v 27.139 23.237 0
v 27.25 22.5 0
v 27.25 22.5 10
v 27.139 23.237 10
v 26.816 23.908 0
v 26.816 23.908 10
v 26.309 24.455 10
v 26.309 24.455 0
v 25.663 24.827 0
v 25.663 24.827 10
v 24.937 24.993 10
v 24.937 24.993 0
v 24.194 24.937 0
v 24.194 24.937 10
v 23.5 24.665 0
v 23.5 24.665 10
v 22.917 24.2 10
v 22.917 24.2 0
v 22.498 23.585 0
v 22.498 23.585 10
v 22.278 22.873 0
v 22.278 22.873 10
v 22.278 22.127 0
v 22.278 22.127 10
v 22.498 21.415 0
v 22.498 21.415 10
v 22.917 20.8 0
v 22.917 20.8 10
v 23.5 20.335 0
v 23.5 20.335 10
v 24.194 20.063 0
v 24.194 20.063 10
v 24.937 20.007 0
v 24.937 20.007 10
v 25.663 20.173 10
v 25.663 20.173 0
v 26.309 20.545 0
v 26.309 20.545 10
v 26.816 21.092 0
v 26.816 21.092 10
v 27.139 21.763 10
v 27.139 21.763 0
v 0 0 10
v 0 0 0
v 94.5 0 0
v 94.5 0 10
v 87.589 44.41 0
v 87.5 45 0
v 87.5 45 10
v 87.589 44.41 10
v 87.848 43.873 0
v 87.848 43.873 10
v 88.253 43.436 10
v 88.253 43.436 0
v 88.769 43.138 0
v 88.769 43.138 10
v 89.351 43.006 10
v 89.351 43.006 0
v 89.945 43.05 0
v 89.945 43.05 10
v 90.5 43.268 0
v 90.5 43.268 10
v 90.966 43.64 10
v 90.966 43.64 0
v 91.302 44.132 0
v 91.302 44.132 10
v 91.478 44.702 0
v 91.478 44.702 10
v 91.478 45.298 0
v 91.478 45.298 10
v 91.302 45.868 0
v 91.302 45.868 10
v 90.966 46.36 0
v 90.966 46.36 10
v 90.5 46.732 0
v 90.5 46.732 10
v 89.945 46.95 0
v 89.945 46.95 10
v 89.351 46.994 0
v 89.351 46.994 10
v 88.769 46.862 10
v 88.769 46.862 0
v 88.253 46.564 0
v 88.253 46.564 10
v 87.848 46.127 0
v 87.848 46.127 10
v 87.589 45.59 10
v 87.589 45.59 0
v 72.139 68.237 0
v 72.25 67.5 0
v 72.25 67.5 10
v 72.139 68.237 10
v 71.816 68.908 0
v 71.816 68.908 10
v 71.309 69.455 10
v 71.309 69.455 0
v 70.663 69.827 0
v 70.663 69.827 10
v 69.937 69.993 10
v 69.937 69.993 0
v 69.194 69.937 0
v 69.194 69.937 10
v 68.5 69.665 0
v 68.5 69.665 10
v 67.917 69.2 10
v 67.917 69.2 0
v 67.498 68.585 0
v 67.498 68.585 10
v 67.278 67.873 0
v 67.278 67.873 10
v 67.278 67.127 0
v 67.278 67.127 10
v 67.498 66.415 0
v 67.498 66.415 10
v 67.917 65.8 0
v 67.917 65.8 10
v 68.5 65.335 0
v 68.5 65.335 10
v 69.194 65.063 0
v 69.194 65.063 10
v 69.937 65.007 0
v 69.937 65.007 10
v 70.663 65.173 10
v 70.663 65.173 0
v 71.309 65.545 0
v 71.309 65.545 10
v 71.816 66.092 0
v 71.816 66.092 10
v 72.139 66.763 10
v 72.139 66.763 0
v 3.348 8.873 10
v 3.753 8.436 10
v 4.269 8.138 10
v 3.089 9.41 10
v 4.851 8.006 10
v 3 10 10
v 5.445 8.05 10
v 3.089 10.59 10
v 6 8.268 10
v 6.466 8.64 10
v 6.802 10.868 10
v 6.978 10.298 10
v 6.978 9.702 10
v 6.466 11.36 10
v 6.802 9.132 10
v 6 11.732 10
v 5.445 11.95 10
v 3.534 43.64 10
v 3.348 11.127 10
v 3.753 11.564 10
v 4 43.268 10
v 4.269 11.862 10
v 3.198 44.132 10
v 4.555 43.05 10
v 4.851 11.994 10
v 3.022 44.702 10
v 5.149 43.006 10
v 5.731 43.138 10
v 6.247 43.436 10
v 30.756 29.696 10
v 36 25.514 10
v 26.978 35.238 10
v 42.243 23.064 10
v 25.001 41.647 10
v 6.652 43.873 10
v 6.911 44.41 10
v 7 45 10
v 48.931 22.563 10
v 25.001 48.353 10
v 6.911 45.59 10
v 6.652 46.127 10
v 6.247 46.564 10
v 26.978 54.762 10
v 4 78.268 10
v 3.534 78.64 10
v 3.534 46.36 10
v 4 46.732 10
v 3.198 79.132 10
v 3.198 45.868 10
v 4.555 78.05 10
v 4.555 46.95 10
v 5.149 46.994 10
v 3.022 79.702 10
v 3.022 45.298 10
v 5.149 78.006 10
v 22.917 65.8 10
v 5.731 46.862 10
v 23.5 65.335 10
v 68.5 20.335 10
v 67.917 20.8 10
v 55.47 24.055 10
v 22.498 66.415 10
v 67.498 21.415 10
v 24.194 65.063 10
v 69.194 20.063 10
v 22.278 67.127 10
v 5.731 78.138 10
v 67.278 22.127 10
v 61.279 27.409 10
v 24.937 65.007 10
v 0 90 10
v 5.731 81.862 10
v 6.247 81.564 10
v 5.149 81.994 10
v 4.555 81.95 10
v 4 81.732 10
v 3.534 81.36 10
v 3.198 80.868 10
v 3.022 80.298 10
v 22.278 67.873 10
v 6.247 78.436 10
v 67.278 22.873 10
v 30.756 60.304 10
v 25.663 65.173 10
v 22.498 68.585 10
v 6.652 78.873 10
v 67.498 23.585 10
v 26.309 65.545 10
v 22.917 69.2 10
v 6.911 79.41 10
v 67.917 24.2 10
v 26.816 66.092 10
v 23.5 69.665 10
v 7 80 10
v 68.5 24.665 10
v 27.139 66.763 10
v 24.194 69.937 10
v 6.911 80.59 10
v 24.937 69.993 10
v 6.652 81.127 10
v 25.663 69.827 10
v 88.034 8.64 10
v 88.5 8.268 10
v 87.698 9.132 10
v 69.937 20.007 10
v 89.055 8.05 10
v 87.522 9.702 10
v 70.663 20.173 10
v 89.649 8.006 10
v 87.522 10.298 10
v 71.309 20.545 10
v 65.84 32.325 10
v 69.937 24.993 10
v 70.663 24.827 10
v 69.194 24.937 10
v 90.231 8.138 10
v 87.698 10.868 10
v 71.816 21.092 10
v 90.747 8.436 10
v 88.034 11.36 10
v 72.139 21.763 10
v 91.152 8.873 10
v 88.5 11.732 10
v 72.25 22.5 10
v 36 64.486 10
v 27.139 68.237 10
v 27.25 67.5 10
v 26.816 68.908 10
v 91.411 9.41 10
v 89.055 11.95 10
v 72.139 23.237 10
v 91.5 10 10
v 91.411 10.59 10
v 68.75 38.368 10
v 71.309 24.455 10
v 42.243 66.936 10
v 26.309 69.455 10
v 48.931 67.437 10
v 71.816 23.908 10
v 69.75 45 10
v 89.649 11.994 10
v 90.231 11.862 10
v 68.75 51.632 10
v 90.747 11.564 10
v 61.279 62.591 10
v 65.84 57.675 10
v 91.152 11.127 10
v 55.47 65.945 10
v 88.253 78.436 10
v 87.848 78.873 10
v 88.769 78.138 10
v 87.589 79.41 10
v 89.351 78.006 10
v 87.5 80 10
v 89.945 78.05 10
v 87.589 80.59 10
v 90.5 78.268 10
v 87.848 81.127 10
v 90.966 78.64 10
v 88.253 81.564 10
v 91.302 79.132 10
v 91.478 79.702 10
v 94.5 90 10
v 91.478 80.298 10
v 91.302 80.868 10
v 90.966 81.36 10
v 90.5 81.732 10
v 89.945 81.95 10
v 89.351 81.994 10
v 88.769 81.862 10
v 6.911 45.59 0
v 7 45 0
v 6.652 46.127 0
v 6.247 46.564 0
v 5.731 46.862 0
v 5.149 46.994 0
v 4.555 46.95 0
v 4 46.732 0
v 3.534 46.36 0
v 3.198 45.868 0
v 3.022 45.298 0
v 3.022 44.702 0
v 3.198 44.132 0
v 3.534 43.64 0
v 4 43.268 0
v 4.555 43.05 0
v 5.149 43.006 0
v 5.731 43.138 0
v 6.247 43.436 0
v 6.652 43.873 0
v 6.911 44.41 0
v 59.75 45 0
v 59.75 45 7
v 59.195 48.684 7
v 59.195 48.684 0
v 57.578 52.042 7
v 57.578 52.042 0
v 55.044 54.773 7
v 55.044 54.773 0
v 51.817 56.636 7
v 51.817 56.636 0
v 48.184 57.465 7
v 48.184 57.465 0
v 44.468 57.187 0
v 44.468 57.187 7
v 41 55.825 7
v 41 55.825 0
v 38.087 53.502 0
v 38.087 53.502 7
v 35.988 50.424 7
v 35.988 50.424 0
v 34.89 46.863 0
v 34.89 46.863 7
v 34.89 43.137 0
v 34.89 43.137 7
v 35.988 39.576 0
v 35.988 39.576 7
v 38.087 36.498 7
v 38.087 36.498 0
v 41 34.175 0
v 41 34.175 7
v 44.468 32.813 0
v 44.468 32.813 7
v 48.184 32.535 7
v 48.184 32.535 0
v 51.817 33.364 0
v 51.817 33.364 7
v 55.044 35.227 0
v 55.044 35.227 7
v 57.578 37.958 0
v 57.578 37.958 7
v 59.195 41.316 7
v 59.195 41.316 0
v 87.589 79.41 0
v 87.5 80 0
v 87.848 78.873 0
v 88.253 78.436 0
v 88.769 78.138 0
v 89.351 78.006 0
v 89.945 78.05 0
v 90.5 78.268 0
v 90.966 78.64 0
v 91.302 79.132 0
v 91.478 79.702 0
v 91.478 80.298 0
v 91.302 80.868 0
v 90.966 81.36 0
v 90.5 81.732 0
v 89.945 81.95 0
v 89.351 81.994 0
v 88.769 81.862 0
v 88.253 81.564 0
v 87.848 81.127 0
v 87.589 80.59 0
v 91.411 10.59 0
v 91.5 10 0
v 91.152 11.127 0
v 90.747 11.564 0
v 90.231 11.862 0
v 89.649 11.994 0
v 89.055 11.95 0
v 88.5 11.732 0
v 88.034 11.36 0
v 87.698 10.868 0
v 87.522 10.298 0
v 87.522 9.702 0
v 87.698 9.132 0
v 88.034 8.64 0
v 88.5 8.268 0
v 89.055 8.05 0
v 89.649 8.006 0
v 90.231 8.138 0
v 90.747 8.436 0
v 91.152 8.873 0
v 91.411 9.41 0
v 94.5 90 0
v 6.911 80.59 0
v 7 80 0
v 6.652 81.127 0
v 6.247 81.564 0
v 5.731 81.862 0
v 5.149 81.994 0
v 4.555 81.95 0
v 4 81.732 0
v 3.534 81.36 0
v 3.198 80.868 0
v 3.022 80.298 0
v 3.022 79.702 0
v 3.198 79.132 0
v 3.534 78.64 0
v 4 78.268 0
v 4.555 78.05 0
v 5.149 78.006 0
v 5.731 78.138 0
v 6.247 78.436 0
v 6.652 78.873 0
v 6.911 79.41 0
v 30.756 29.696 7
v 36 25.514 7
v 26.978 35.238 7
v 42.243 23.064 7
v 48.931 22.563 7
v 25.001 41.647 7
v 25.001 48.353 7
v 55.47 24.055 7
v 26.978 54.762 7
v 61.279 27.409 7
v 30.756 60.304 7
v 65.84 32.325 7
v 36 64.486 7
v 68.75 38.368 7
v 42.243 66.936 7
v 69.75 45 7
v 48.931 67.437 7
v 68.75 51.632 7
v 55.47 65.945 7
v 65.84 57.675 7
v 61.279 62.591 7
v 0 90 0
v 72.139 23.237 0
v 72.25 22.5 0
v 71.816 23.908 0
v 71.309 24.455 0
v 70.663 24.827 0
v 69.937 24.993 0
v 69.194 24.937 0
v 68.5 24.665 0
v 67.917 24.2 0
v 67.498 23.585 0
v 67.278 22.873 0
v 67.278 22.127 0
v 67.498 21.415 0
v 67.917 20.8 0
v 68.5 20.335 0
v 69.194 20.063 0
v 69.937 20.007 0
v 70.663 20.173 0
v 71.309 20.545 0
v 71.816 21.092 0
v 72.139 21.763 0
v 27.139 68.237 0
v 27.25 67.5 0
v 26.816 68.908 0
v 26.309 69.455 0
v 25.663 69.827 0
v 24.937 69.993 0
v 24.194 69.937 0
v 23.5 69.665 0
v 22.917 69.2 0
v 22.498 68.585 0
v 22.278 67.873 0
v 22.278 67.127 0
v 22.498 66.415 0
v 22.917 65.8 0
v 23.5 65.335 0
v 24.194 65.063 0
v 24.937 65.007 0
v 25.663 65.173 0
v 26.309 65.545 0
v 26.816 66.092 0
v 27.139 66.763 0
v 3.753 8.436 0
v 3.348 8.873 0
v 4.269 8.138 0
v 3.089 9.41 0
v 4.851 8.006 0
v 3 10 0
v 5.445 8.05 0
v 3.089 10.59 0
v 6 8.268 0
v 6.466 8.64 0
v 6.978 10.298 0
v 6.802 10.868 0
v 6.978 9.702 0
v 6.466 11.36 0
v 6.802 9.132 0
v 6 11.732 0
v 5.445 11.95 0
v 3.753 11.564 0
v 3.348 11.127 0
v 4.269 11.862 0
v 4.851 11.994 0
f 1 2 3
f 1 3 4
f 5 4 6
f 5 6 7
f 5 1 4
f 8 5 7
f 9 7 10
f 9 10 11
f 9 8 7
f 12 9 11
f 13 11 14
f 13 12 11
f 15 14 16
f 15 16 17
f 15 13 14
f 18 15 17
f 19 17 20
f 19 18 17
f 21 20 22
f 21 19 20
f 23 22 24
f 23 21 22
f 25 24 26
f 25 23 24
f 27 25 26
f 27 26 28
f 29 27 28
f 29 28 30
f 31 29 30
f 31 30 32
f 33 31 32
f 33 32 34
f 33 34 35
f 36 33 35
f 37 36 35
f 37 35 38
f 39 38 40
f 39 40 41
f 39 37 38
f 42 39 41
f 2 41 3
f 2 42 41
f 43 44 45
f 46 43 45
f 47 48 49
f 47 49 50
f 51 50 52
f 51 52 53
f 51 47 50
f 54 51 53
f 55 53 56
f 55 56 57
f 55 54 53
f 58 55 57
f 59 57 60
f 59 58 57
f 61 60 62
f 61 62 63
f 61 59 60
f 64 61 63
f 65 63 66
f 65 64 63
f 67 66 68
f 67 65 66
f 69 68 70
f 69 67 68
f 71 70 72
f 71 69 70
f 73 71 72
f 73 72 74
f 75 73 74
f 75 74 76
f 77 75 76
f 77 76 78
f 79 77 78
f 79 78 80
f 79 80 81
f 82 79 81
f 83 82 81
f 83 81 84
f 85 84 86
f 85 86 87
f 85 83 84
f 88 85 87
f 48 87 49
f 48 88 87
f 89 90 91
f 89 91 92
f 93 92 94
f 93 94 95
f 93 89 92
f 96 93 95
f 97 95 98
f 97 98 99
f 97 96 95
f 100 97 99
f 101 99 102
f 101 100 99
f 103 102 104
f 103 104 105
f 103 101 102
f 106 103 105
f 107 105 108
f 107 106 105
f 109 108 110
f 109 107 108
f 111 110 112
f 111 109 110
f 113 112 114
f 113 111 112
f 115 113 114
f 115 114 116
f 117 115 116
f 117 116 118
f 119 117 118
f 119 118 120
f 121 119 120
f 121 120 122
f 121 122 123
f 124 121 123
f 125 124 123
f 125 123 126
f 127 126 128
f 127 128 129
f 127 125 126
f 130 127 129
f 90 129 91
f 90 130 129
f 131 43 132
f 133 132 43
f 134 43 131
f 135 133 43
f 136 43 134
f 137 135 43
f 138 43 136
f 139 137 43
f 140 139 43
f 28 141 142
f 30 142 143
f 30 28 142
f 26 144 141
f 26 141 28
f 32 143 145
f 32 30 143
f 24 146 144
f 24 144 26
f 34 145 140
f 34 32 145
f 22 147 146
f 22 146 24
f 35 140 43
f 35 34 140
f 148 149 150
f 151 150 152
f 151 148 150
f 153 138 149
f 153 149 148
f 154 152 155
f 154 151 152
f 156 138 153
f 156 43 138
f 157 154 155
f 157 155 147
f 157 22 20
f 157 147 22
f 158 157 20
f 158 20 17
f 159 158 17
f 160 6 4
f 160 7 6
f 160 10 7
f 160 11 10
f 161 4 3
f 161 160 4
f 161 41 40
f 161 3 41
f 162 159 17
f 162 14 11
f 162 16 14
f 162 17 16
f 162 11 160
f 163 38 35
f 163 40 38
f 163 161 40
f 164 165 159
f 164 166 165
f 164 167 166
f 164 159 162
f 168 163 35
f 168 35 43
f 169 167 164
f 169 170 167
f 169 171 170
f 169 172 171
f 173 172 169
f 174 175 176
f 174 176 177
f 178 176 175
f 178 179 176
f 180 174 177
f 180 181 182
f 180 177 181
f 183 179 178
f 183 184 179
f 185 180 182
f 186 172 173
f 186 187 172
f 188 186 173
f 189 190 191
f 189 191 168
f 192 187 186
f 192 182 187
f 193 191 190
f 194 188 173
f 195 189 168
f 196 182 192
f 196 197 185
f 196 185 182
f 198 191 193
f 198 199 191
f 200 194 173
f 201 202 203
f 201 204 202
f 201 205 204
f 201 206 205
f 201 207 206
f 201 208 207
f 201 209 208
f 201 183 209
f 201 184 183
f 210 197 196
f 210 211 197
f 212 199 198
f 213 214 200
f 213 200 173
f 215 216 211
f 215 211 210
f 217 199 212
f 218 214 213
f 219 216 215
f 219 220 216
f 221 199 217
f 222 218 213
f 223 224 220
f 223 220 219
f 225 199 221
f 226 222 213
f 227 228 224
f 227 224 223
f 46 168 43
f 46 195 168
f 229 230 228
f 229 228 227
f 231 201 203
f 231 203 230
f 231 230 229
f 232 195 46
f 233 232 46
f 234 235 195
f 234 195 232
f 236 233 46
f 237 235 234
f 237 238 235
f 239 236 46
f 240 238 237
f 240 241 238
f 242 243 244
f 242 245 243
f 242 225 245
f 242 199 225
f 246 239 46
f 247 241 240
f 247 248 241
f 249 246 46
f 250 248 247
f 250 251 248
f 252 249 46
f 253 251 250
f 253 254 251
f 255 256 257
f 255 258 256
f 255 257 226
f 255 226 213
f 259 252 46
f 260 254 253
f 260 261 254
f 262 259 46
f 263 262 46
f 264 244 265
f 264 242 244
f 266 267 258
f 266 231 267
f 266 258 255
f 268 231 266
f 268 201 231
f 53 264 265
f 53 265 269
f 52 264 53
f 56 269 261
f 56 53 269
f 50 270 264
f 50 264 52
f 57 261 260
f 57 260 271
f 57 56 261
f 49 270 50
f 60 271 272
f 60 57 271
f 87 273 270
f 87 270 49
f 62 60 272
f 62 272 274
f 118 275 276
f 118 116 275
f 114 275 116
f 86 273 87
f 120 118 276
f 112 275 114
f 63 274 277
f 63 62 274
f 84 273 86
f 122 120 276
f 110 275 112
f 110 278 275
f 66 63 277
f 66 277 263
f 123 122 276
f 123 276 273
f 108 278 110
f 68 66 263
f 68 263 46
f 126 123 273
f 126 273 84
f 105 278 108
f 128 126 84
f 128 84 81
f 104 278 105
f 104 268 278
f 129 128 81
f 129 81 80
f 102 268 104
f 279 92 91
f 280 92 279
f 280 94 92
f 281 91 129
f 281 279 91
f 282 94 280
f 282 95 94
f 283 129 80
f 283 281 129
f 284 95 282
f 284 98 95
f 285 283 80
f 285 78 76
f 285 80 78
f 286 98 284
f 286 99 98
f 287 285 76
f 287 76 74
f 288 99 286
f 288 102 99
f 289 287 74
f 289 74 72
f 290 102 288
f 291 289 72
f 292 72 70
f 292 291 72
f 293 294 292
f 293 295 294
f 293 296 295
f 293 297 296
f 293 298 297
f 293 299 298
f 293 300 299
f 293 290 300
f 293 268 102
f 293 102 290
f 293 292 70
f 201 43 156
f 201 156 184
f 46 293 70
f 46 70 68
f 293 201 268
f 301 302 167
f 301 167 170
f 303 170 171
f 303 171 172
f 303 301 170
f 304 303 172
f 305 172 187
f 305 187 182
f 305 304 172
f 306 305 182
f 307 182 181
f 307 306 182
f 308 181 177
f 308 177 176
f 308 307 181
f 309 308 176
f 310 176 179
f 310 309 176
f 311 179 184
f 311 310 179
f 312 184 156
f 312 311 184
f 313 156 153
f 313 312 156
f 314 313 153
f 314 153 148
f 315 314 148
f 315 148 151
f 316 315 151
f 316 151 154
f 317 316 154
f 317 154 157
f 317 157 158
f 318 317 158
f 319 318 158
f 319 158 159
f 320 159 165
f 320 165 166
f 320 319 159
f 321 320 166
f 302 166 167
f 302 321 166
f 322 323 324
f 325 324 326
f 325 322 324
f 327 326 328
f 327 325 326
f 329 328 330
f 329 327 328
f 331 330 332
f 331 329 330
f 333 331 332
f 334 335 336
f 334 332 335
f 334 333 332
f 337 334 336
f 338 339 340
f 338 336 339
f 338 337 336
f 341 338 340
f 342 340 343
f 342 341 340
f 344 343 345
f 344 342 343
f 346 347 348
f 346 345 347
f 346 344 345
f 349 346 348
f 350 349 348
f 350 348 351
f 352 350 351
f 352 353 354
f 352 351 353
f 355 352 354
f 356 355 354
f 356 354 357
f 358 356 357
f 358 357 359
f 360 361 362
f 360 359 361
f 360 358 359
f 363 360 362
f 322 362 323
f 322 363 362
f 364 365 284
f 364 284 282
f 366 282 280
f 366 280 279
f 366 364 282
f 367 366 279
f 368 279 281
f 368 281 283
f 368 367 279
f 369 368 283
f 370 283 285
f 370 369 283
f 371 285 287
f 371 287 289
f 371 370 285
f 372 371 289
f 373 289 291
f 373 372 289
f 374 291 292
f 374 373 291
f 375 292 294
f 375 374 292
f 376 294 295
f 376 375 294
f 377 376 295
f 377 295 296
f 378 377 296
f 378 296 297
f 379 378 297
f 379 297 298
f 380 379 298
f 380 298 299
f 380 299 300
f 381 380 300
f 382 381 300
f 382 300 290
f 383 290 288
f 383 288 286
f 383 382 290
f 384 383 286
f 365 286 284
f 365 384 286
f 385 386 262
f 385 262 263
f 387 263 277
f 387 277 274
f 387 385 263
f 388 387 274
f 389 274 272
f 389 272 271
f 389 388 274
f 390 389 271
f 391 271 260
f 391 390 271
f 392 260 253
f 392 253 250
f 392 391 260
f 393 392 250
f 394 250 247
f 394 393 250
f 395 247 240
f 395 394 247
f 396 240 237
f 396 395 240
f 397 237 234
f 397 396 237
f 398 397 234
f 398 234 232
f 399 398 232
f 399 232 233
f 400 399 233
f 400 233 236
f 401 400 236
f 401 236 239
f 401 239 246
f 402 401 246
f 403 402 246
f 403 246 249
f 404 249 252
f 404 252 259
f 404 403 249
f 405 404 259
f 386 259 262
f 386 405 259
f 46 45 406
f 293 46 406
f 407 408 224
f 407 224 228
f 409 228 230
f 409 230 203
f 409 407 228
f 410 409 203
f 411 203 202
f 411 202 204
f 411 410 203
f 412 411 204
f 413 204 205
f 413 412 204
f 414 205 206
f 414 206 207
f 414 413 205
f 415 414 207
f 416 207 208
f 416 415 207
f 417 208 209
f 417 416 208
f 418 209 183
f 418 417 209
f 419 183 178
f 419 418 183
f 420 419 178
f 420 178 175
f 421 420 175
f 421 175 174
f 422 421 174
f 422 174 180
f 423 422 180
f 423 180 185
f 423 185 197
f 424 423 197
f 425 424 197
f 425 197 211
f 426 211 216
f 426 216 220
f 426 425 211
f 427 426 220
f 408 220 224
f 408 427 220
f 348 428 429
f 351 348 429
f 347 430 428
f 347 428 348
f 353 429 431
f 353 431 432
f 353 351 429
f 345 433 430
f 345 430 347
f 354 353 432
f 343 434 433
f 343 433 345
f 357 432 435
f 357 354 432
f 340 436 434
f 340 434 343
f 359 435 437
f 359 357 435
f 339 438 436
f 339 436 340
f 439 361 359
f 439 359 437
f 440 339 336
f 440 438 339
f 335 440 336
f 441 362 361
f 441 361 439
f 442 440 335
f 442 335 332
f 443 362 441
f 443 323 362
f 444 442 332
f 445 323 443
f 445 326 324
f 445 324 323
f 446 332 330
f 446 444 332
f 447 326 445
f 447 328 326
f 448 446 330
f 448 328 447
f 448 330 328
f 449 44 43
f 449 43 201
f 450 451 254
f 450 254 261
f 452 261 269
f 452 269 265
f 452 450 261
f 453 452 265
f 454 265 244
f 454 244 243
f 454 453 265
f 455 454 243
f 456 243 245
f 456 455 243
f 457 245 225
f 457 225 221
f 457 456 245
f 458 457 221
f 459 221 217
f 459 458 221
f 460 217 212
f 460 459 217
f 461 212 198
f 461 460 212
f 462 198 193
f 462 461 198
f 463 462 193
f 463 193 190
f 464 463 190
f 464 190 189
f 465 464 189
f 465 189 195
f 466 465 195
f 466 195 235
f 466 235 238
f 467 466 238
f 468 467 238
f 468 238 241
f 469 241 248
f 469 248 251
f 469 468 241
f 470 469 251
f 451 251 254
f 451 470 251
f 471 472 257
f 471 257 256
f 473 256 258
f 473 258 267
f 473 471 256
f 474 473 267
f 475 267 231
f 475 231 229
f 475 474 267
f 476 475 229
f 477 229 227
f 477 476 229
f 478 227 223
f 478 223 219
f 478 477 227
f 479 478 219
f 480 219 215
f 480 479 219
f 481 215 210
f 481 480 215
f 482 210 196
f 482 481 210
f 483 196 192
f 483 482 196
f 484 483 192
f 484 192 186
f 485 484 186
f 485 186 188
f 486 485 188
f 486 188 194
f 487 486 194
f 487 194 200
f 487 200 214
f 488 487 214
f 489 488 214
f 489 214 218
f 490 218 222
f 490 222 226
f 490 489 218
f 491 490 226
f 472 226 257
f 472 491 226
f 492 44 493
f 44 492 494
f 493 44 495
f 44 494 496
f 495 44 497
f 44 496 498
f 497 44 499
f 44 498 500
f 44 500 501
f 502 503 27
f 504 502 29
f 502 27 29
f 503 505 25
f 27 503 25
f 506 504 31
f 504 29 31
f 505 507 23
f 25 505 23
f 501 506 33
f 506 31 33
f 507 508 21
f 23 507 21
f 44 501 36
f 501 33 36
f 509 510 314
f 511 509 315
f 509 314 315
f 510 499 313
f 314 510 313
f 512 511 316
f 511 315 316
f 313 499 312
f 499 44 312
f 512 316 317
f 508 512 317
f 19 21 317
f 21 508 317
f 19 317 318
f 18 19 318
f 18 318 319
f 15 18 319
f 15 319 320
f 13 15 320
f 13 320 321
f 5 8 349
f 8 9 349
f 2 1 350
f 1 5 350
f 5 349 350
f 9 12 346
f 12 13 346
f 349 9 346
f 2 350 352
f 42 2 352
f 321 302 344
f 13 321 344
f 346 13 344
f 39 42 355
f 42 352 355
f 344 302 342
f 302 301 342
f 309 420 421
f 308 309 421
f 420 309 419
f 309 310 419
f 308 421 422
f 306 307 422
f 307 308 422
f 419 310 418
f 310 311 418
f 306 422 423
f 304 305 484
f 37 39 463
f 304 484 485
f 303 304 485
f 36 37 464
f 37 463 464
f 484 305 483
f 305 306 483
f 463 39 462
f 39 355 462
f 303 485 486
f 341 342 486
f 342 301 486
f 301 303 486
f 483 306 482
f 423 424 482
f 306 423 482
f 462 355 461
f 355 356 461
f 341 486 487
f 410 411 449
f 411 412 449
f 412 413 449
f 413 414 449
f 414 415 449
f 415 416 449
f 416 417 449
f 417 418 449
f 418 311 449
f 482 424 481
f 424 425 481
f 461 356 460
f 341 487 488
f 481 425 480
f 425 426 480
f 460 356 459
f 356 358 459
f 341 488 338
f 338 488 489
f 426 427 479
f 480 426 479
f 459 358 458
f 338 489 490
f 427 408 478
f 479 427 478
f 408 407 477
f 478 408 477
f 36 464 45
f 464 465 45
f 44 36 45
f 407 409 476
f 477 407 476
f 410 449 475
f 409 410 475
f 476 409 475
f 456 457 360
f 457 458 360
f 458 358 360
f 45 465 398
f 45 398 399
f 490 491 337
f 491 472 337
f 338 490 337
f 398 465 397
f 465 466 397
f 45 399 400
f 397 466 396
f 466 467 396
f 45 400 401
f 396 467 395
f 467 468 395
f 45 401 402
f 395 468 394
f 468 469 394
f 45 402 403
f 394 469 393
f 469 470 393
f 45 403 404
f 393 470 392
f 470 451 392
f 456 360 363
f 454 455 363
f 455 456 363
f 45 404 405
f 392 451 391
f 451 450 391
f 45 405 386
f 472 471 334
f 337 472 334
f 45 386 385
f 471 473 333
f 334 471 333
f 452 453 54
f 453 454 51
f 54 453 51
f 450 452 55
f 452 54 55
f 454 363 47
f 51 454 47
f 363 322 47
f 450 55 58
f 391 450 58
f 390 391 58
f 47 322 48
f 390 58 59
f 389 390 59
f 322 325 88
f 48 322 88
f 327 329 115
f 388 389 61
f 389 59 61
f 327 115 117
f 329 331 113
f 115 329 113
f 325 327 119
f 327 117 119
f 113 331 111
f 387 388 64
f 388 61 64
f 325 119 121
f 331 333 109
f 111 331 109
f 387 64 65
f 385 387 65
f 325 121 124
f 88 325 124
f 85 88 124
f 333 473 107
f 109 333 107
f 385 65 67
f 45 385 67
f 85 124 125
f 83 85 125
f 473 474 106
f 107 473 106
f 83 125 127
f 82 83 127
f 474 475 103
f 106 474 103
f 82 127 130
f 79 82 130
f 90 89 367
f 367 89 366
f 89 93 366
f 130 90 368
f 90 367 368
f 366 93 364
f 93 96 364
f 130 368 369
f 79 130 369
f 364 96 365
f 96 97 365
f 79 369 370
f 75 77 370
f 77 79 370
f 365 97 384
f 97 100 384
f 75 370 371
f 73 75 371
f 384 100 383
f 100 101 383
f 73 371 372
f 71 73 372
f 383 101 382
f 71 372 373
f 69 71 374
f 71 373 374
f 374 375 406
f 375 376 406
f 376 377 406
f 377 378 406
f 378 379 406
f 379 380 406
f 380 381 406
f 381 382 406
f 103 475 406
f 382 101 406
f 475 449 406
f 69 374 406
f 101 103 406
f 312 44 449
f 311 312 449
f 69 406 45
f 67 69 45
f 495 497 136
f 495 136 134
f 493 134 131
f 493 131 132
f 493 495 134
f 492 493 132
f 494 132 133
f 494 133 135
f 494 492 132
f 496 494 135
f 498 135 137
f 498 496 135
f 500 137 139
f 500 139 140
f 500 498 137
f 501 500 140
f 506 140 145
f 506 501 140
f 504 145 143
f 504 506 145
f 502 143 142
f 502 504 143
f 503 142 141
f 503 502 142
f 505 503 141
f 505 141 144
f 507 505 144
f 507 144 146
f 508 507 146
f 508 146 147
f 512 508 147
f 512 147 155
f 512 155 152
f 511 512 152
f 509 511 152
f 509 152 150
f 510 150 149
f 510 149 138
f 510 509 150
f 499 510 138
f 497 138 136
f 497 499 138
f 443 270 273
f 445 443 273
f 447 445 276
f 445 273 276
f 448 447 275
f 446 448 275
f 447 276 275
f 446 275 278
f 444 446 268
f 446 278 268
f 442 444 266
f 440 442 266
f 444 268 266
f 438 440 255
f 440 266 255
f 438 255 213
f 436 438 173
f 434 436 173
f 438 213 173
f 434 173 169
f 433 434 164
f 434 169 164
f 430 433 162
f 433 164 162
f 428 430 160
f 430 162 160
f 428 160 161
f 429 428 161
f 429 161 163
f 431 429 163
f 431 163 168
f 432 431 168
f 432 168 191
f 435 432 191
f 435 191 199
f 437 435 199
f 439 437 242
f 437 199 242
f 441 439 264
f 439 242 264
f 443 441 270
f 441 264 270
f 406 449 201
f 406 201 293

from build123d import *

# Parameters (mm, degrees)
SKETCH1_W           = 94.5
SKETCH1_H           = 90
SKETCH1_R           = 2
SKETCH1_R_2         = 2.5
SKETCH1_R_3         = 12.5
BOSS_EXTRUDE1_DEPTH = 10
SKETCH3_R           = 22.5
CUT_EXTRUDE2_DEPTH  = 3


with BuildPart() as part:
    # Sketch1 → Boss-Extrude1 (new body)
    with BuildSketch(Plane.XY):
        with Locations((47.25, 45)):
            Rectangle(SKETCH1_W, SKETCH1_H)
        with Locations((5, 80)):
            Circle(SKETCH1_R, mode=Mode.SUBTRACT)
        with Locations((5, 45)):
            Circle(SKETCH1_R, mode=Mode.SUBTRACT)
        with Locations(Location((5, 10, 0), (0, 0, 180))):
            Circle(SKETCH1_R, mode=Mode.SUBTRACT)
        with Locations((89.5, 10)):
            Circle(SKETCH1_R, mode=Mode.SUBTRACT)
        with Locations(Location((89.5, 45, 0), (0, 0, 180))):
            Circle(SKETCH1_R, mode=Mode.SUBTRACT)
        with Locations(Location((89.5, 80, 0), (0, 0, 180))):
            Circle(SKETCH1_R, mode=Mode.SUBTRACT)
        with Locations((24.75, 67.5)):
            Circle(SKETCH1_R_2, mode=Mode.SUBTRACT)
        with Locations((69.75, 67.5)):
            Circle(SKETCH1_R_2, mode=Mode.SUBTRACT)
        with Locations((69.75, 22.5)):
            Circle(SKETCH1_R_2, mode=Mode.SUBTRACT)
        with Locations((24.75, 22.5)):
            Circle(SKETCH1_R_2, mode=Mode.SUBTRACT)
        with Locations((47.25, 45)):
            Circle(SKETCH1_R_3, mode=Mode.SUBTRACT)
    extrude(amount=BOSS_EXTRUDE1_DEPTH)

    # Sketch3 → Cut-Extrude2 (cut)
    with BuildSketch(Plane.XY.offset(10)):
        with Locations((47.25, 45)):
            Circle(SKETCH3_R)
    extrude(amount=-CUT_EXTRUDE2_DEPTH, mode=Mode.SUBTRACT)


solid = part.part
